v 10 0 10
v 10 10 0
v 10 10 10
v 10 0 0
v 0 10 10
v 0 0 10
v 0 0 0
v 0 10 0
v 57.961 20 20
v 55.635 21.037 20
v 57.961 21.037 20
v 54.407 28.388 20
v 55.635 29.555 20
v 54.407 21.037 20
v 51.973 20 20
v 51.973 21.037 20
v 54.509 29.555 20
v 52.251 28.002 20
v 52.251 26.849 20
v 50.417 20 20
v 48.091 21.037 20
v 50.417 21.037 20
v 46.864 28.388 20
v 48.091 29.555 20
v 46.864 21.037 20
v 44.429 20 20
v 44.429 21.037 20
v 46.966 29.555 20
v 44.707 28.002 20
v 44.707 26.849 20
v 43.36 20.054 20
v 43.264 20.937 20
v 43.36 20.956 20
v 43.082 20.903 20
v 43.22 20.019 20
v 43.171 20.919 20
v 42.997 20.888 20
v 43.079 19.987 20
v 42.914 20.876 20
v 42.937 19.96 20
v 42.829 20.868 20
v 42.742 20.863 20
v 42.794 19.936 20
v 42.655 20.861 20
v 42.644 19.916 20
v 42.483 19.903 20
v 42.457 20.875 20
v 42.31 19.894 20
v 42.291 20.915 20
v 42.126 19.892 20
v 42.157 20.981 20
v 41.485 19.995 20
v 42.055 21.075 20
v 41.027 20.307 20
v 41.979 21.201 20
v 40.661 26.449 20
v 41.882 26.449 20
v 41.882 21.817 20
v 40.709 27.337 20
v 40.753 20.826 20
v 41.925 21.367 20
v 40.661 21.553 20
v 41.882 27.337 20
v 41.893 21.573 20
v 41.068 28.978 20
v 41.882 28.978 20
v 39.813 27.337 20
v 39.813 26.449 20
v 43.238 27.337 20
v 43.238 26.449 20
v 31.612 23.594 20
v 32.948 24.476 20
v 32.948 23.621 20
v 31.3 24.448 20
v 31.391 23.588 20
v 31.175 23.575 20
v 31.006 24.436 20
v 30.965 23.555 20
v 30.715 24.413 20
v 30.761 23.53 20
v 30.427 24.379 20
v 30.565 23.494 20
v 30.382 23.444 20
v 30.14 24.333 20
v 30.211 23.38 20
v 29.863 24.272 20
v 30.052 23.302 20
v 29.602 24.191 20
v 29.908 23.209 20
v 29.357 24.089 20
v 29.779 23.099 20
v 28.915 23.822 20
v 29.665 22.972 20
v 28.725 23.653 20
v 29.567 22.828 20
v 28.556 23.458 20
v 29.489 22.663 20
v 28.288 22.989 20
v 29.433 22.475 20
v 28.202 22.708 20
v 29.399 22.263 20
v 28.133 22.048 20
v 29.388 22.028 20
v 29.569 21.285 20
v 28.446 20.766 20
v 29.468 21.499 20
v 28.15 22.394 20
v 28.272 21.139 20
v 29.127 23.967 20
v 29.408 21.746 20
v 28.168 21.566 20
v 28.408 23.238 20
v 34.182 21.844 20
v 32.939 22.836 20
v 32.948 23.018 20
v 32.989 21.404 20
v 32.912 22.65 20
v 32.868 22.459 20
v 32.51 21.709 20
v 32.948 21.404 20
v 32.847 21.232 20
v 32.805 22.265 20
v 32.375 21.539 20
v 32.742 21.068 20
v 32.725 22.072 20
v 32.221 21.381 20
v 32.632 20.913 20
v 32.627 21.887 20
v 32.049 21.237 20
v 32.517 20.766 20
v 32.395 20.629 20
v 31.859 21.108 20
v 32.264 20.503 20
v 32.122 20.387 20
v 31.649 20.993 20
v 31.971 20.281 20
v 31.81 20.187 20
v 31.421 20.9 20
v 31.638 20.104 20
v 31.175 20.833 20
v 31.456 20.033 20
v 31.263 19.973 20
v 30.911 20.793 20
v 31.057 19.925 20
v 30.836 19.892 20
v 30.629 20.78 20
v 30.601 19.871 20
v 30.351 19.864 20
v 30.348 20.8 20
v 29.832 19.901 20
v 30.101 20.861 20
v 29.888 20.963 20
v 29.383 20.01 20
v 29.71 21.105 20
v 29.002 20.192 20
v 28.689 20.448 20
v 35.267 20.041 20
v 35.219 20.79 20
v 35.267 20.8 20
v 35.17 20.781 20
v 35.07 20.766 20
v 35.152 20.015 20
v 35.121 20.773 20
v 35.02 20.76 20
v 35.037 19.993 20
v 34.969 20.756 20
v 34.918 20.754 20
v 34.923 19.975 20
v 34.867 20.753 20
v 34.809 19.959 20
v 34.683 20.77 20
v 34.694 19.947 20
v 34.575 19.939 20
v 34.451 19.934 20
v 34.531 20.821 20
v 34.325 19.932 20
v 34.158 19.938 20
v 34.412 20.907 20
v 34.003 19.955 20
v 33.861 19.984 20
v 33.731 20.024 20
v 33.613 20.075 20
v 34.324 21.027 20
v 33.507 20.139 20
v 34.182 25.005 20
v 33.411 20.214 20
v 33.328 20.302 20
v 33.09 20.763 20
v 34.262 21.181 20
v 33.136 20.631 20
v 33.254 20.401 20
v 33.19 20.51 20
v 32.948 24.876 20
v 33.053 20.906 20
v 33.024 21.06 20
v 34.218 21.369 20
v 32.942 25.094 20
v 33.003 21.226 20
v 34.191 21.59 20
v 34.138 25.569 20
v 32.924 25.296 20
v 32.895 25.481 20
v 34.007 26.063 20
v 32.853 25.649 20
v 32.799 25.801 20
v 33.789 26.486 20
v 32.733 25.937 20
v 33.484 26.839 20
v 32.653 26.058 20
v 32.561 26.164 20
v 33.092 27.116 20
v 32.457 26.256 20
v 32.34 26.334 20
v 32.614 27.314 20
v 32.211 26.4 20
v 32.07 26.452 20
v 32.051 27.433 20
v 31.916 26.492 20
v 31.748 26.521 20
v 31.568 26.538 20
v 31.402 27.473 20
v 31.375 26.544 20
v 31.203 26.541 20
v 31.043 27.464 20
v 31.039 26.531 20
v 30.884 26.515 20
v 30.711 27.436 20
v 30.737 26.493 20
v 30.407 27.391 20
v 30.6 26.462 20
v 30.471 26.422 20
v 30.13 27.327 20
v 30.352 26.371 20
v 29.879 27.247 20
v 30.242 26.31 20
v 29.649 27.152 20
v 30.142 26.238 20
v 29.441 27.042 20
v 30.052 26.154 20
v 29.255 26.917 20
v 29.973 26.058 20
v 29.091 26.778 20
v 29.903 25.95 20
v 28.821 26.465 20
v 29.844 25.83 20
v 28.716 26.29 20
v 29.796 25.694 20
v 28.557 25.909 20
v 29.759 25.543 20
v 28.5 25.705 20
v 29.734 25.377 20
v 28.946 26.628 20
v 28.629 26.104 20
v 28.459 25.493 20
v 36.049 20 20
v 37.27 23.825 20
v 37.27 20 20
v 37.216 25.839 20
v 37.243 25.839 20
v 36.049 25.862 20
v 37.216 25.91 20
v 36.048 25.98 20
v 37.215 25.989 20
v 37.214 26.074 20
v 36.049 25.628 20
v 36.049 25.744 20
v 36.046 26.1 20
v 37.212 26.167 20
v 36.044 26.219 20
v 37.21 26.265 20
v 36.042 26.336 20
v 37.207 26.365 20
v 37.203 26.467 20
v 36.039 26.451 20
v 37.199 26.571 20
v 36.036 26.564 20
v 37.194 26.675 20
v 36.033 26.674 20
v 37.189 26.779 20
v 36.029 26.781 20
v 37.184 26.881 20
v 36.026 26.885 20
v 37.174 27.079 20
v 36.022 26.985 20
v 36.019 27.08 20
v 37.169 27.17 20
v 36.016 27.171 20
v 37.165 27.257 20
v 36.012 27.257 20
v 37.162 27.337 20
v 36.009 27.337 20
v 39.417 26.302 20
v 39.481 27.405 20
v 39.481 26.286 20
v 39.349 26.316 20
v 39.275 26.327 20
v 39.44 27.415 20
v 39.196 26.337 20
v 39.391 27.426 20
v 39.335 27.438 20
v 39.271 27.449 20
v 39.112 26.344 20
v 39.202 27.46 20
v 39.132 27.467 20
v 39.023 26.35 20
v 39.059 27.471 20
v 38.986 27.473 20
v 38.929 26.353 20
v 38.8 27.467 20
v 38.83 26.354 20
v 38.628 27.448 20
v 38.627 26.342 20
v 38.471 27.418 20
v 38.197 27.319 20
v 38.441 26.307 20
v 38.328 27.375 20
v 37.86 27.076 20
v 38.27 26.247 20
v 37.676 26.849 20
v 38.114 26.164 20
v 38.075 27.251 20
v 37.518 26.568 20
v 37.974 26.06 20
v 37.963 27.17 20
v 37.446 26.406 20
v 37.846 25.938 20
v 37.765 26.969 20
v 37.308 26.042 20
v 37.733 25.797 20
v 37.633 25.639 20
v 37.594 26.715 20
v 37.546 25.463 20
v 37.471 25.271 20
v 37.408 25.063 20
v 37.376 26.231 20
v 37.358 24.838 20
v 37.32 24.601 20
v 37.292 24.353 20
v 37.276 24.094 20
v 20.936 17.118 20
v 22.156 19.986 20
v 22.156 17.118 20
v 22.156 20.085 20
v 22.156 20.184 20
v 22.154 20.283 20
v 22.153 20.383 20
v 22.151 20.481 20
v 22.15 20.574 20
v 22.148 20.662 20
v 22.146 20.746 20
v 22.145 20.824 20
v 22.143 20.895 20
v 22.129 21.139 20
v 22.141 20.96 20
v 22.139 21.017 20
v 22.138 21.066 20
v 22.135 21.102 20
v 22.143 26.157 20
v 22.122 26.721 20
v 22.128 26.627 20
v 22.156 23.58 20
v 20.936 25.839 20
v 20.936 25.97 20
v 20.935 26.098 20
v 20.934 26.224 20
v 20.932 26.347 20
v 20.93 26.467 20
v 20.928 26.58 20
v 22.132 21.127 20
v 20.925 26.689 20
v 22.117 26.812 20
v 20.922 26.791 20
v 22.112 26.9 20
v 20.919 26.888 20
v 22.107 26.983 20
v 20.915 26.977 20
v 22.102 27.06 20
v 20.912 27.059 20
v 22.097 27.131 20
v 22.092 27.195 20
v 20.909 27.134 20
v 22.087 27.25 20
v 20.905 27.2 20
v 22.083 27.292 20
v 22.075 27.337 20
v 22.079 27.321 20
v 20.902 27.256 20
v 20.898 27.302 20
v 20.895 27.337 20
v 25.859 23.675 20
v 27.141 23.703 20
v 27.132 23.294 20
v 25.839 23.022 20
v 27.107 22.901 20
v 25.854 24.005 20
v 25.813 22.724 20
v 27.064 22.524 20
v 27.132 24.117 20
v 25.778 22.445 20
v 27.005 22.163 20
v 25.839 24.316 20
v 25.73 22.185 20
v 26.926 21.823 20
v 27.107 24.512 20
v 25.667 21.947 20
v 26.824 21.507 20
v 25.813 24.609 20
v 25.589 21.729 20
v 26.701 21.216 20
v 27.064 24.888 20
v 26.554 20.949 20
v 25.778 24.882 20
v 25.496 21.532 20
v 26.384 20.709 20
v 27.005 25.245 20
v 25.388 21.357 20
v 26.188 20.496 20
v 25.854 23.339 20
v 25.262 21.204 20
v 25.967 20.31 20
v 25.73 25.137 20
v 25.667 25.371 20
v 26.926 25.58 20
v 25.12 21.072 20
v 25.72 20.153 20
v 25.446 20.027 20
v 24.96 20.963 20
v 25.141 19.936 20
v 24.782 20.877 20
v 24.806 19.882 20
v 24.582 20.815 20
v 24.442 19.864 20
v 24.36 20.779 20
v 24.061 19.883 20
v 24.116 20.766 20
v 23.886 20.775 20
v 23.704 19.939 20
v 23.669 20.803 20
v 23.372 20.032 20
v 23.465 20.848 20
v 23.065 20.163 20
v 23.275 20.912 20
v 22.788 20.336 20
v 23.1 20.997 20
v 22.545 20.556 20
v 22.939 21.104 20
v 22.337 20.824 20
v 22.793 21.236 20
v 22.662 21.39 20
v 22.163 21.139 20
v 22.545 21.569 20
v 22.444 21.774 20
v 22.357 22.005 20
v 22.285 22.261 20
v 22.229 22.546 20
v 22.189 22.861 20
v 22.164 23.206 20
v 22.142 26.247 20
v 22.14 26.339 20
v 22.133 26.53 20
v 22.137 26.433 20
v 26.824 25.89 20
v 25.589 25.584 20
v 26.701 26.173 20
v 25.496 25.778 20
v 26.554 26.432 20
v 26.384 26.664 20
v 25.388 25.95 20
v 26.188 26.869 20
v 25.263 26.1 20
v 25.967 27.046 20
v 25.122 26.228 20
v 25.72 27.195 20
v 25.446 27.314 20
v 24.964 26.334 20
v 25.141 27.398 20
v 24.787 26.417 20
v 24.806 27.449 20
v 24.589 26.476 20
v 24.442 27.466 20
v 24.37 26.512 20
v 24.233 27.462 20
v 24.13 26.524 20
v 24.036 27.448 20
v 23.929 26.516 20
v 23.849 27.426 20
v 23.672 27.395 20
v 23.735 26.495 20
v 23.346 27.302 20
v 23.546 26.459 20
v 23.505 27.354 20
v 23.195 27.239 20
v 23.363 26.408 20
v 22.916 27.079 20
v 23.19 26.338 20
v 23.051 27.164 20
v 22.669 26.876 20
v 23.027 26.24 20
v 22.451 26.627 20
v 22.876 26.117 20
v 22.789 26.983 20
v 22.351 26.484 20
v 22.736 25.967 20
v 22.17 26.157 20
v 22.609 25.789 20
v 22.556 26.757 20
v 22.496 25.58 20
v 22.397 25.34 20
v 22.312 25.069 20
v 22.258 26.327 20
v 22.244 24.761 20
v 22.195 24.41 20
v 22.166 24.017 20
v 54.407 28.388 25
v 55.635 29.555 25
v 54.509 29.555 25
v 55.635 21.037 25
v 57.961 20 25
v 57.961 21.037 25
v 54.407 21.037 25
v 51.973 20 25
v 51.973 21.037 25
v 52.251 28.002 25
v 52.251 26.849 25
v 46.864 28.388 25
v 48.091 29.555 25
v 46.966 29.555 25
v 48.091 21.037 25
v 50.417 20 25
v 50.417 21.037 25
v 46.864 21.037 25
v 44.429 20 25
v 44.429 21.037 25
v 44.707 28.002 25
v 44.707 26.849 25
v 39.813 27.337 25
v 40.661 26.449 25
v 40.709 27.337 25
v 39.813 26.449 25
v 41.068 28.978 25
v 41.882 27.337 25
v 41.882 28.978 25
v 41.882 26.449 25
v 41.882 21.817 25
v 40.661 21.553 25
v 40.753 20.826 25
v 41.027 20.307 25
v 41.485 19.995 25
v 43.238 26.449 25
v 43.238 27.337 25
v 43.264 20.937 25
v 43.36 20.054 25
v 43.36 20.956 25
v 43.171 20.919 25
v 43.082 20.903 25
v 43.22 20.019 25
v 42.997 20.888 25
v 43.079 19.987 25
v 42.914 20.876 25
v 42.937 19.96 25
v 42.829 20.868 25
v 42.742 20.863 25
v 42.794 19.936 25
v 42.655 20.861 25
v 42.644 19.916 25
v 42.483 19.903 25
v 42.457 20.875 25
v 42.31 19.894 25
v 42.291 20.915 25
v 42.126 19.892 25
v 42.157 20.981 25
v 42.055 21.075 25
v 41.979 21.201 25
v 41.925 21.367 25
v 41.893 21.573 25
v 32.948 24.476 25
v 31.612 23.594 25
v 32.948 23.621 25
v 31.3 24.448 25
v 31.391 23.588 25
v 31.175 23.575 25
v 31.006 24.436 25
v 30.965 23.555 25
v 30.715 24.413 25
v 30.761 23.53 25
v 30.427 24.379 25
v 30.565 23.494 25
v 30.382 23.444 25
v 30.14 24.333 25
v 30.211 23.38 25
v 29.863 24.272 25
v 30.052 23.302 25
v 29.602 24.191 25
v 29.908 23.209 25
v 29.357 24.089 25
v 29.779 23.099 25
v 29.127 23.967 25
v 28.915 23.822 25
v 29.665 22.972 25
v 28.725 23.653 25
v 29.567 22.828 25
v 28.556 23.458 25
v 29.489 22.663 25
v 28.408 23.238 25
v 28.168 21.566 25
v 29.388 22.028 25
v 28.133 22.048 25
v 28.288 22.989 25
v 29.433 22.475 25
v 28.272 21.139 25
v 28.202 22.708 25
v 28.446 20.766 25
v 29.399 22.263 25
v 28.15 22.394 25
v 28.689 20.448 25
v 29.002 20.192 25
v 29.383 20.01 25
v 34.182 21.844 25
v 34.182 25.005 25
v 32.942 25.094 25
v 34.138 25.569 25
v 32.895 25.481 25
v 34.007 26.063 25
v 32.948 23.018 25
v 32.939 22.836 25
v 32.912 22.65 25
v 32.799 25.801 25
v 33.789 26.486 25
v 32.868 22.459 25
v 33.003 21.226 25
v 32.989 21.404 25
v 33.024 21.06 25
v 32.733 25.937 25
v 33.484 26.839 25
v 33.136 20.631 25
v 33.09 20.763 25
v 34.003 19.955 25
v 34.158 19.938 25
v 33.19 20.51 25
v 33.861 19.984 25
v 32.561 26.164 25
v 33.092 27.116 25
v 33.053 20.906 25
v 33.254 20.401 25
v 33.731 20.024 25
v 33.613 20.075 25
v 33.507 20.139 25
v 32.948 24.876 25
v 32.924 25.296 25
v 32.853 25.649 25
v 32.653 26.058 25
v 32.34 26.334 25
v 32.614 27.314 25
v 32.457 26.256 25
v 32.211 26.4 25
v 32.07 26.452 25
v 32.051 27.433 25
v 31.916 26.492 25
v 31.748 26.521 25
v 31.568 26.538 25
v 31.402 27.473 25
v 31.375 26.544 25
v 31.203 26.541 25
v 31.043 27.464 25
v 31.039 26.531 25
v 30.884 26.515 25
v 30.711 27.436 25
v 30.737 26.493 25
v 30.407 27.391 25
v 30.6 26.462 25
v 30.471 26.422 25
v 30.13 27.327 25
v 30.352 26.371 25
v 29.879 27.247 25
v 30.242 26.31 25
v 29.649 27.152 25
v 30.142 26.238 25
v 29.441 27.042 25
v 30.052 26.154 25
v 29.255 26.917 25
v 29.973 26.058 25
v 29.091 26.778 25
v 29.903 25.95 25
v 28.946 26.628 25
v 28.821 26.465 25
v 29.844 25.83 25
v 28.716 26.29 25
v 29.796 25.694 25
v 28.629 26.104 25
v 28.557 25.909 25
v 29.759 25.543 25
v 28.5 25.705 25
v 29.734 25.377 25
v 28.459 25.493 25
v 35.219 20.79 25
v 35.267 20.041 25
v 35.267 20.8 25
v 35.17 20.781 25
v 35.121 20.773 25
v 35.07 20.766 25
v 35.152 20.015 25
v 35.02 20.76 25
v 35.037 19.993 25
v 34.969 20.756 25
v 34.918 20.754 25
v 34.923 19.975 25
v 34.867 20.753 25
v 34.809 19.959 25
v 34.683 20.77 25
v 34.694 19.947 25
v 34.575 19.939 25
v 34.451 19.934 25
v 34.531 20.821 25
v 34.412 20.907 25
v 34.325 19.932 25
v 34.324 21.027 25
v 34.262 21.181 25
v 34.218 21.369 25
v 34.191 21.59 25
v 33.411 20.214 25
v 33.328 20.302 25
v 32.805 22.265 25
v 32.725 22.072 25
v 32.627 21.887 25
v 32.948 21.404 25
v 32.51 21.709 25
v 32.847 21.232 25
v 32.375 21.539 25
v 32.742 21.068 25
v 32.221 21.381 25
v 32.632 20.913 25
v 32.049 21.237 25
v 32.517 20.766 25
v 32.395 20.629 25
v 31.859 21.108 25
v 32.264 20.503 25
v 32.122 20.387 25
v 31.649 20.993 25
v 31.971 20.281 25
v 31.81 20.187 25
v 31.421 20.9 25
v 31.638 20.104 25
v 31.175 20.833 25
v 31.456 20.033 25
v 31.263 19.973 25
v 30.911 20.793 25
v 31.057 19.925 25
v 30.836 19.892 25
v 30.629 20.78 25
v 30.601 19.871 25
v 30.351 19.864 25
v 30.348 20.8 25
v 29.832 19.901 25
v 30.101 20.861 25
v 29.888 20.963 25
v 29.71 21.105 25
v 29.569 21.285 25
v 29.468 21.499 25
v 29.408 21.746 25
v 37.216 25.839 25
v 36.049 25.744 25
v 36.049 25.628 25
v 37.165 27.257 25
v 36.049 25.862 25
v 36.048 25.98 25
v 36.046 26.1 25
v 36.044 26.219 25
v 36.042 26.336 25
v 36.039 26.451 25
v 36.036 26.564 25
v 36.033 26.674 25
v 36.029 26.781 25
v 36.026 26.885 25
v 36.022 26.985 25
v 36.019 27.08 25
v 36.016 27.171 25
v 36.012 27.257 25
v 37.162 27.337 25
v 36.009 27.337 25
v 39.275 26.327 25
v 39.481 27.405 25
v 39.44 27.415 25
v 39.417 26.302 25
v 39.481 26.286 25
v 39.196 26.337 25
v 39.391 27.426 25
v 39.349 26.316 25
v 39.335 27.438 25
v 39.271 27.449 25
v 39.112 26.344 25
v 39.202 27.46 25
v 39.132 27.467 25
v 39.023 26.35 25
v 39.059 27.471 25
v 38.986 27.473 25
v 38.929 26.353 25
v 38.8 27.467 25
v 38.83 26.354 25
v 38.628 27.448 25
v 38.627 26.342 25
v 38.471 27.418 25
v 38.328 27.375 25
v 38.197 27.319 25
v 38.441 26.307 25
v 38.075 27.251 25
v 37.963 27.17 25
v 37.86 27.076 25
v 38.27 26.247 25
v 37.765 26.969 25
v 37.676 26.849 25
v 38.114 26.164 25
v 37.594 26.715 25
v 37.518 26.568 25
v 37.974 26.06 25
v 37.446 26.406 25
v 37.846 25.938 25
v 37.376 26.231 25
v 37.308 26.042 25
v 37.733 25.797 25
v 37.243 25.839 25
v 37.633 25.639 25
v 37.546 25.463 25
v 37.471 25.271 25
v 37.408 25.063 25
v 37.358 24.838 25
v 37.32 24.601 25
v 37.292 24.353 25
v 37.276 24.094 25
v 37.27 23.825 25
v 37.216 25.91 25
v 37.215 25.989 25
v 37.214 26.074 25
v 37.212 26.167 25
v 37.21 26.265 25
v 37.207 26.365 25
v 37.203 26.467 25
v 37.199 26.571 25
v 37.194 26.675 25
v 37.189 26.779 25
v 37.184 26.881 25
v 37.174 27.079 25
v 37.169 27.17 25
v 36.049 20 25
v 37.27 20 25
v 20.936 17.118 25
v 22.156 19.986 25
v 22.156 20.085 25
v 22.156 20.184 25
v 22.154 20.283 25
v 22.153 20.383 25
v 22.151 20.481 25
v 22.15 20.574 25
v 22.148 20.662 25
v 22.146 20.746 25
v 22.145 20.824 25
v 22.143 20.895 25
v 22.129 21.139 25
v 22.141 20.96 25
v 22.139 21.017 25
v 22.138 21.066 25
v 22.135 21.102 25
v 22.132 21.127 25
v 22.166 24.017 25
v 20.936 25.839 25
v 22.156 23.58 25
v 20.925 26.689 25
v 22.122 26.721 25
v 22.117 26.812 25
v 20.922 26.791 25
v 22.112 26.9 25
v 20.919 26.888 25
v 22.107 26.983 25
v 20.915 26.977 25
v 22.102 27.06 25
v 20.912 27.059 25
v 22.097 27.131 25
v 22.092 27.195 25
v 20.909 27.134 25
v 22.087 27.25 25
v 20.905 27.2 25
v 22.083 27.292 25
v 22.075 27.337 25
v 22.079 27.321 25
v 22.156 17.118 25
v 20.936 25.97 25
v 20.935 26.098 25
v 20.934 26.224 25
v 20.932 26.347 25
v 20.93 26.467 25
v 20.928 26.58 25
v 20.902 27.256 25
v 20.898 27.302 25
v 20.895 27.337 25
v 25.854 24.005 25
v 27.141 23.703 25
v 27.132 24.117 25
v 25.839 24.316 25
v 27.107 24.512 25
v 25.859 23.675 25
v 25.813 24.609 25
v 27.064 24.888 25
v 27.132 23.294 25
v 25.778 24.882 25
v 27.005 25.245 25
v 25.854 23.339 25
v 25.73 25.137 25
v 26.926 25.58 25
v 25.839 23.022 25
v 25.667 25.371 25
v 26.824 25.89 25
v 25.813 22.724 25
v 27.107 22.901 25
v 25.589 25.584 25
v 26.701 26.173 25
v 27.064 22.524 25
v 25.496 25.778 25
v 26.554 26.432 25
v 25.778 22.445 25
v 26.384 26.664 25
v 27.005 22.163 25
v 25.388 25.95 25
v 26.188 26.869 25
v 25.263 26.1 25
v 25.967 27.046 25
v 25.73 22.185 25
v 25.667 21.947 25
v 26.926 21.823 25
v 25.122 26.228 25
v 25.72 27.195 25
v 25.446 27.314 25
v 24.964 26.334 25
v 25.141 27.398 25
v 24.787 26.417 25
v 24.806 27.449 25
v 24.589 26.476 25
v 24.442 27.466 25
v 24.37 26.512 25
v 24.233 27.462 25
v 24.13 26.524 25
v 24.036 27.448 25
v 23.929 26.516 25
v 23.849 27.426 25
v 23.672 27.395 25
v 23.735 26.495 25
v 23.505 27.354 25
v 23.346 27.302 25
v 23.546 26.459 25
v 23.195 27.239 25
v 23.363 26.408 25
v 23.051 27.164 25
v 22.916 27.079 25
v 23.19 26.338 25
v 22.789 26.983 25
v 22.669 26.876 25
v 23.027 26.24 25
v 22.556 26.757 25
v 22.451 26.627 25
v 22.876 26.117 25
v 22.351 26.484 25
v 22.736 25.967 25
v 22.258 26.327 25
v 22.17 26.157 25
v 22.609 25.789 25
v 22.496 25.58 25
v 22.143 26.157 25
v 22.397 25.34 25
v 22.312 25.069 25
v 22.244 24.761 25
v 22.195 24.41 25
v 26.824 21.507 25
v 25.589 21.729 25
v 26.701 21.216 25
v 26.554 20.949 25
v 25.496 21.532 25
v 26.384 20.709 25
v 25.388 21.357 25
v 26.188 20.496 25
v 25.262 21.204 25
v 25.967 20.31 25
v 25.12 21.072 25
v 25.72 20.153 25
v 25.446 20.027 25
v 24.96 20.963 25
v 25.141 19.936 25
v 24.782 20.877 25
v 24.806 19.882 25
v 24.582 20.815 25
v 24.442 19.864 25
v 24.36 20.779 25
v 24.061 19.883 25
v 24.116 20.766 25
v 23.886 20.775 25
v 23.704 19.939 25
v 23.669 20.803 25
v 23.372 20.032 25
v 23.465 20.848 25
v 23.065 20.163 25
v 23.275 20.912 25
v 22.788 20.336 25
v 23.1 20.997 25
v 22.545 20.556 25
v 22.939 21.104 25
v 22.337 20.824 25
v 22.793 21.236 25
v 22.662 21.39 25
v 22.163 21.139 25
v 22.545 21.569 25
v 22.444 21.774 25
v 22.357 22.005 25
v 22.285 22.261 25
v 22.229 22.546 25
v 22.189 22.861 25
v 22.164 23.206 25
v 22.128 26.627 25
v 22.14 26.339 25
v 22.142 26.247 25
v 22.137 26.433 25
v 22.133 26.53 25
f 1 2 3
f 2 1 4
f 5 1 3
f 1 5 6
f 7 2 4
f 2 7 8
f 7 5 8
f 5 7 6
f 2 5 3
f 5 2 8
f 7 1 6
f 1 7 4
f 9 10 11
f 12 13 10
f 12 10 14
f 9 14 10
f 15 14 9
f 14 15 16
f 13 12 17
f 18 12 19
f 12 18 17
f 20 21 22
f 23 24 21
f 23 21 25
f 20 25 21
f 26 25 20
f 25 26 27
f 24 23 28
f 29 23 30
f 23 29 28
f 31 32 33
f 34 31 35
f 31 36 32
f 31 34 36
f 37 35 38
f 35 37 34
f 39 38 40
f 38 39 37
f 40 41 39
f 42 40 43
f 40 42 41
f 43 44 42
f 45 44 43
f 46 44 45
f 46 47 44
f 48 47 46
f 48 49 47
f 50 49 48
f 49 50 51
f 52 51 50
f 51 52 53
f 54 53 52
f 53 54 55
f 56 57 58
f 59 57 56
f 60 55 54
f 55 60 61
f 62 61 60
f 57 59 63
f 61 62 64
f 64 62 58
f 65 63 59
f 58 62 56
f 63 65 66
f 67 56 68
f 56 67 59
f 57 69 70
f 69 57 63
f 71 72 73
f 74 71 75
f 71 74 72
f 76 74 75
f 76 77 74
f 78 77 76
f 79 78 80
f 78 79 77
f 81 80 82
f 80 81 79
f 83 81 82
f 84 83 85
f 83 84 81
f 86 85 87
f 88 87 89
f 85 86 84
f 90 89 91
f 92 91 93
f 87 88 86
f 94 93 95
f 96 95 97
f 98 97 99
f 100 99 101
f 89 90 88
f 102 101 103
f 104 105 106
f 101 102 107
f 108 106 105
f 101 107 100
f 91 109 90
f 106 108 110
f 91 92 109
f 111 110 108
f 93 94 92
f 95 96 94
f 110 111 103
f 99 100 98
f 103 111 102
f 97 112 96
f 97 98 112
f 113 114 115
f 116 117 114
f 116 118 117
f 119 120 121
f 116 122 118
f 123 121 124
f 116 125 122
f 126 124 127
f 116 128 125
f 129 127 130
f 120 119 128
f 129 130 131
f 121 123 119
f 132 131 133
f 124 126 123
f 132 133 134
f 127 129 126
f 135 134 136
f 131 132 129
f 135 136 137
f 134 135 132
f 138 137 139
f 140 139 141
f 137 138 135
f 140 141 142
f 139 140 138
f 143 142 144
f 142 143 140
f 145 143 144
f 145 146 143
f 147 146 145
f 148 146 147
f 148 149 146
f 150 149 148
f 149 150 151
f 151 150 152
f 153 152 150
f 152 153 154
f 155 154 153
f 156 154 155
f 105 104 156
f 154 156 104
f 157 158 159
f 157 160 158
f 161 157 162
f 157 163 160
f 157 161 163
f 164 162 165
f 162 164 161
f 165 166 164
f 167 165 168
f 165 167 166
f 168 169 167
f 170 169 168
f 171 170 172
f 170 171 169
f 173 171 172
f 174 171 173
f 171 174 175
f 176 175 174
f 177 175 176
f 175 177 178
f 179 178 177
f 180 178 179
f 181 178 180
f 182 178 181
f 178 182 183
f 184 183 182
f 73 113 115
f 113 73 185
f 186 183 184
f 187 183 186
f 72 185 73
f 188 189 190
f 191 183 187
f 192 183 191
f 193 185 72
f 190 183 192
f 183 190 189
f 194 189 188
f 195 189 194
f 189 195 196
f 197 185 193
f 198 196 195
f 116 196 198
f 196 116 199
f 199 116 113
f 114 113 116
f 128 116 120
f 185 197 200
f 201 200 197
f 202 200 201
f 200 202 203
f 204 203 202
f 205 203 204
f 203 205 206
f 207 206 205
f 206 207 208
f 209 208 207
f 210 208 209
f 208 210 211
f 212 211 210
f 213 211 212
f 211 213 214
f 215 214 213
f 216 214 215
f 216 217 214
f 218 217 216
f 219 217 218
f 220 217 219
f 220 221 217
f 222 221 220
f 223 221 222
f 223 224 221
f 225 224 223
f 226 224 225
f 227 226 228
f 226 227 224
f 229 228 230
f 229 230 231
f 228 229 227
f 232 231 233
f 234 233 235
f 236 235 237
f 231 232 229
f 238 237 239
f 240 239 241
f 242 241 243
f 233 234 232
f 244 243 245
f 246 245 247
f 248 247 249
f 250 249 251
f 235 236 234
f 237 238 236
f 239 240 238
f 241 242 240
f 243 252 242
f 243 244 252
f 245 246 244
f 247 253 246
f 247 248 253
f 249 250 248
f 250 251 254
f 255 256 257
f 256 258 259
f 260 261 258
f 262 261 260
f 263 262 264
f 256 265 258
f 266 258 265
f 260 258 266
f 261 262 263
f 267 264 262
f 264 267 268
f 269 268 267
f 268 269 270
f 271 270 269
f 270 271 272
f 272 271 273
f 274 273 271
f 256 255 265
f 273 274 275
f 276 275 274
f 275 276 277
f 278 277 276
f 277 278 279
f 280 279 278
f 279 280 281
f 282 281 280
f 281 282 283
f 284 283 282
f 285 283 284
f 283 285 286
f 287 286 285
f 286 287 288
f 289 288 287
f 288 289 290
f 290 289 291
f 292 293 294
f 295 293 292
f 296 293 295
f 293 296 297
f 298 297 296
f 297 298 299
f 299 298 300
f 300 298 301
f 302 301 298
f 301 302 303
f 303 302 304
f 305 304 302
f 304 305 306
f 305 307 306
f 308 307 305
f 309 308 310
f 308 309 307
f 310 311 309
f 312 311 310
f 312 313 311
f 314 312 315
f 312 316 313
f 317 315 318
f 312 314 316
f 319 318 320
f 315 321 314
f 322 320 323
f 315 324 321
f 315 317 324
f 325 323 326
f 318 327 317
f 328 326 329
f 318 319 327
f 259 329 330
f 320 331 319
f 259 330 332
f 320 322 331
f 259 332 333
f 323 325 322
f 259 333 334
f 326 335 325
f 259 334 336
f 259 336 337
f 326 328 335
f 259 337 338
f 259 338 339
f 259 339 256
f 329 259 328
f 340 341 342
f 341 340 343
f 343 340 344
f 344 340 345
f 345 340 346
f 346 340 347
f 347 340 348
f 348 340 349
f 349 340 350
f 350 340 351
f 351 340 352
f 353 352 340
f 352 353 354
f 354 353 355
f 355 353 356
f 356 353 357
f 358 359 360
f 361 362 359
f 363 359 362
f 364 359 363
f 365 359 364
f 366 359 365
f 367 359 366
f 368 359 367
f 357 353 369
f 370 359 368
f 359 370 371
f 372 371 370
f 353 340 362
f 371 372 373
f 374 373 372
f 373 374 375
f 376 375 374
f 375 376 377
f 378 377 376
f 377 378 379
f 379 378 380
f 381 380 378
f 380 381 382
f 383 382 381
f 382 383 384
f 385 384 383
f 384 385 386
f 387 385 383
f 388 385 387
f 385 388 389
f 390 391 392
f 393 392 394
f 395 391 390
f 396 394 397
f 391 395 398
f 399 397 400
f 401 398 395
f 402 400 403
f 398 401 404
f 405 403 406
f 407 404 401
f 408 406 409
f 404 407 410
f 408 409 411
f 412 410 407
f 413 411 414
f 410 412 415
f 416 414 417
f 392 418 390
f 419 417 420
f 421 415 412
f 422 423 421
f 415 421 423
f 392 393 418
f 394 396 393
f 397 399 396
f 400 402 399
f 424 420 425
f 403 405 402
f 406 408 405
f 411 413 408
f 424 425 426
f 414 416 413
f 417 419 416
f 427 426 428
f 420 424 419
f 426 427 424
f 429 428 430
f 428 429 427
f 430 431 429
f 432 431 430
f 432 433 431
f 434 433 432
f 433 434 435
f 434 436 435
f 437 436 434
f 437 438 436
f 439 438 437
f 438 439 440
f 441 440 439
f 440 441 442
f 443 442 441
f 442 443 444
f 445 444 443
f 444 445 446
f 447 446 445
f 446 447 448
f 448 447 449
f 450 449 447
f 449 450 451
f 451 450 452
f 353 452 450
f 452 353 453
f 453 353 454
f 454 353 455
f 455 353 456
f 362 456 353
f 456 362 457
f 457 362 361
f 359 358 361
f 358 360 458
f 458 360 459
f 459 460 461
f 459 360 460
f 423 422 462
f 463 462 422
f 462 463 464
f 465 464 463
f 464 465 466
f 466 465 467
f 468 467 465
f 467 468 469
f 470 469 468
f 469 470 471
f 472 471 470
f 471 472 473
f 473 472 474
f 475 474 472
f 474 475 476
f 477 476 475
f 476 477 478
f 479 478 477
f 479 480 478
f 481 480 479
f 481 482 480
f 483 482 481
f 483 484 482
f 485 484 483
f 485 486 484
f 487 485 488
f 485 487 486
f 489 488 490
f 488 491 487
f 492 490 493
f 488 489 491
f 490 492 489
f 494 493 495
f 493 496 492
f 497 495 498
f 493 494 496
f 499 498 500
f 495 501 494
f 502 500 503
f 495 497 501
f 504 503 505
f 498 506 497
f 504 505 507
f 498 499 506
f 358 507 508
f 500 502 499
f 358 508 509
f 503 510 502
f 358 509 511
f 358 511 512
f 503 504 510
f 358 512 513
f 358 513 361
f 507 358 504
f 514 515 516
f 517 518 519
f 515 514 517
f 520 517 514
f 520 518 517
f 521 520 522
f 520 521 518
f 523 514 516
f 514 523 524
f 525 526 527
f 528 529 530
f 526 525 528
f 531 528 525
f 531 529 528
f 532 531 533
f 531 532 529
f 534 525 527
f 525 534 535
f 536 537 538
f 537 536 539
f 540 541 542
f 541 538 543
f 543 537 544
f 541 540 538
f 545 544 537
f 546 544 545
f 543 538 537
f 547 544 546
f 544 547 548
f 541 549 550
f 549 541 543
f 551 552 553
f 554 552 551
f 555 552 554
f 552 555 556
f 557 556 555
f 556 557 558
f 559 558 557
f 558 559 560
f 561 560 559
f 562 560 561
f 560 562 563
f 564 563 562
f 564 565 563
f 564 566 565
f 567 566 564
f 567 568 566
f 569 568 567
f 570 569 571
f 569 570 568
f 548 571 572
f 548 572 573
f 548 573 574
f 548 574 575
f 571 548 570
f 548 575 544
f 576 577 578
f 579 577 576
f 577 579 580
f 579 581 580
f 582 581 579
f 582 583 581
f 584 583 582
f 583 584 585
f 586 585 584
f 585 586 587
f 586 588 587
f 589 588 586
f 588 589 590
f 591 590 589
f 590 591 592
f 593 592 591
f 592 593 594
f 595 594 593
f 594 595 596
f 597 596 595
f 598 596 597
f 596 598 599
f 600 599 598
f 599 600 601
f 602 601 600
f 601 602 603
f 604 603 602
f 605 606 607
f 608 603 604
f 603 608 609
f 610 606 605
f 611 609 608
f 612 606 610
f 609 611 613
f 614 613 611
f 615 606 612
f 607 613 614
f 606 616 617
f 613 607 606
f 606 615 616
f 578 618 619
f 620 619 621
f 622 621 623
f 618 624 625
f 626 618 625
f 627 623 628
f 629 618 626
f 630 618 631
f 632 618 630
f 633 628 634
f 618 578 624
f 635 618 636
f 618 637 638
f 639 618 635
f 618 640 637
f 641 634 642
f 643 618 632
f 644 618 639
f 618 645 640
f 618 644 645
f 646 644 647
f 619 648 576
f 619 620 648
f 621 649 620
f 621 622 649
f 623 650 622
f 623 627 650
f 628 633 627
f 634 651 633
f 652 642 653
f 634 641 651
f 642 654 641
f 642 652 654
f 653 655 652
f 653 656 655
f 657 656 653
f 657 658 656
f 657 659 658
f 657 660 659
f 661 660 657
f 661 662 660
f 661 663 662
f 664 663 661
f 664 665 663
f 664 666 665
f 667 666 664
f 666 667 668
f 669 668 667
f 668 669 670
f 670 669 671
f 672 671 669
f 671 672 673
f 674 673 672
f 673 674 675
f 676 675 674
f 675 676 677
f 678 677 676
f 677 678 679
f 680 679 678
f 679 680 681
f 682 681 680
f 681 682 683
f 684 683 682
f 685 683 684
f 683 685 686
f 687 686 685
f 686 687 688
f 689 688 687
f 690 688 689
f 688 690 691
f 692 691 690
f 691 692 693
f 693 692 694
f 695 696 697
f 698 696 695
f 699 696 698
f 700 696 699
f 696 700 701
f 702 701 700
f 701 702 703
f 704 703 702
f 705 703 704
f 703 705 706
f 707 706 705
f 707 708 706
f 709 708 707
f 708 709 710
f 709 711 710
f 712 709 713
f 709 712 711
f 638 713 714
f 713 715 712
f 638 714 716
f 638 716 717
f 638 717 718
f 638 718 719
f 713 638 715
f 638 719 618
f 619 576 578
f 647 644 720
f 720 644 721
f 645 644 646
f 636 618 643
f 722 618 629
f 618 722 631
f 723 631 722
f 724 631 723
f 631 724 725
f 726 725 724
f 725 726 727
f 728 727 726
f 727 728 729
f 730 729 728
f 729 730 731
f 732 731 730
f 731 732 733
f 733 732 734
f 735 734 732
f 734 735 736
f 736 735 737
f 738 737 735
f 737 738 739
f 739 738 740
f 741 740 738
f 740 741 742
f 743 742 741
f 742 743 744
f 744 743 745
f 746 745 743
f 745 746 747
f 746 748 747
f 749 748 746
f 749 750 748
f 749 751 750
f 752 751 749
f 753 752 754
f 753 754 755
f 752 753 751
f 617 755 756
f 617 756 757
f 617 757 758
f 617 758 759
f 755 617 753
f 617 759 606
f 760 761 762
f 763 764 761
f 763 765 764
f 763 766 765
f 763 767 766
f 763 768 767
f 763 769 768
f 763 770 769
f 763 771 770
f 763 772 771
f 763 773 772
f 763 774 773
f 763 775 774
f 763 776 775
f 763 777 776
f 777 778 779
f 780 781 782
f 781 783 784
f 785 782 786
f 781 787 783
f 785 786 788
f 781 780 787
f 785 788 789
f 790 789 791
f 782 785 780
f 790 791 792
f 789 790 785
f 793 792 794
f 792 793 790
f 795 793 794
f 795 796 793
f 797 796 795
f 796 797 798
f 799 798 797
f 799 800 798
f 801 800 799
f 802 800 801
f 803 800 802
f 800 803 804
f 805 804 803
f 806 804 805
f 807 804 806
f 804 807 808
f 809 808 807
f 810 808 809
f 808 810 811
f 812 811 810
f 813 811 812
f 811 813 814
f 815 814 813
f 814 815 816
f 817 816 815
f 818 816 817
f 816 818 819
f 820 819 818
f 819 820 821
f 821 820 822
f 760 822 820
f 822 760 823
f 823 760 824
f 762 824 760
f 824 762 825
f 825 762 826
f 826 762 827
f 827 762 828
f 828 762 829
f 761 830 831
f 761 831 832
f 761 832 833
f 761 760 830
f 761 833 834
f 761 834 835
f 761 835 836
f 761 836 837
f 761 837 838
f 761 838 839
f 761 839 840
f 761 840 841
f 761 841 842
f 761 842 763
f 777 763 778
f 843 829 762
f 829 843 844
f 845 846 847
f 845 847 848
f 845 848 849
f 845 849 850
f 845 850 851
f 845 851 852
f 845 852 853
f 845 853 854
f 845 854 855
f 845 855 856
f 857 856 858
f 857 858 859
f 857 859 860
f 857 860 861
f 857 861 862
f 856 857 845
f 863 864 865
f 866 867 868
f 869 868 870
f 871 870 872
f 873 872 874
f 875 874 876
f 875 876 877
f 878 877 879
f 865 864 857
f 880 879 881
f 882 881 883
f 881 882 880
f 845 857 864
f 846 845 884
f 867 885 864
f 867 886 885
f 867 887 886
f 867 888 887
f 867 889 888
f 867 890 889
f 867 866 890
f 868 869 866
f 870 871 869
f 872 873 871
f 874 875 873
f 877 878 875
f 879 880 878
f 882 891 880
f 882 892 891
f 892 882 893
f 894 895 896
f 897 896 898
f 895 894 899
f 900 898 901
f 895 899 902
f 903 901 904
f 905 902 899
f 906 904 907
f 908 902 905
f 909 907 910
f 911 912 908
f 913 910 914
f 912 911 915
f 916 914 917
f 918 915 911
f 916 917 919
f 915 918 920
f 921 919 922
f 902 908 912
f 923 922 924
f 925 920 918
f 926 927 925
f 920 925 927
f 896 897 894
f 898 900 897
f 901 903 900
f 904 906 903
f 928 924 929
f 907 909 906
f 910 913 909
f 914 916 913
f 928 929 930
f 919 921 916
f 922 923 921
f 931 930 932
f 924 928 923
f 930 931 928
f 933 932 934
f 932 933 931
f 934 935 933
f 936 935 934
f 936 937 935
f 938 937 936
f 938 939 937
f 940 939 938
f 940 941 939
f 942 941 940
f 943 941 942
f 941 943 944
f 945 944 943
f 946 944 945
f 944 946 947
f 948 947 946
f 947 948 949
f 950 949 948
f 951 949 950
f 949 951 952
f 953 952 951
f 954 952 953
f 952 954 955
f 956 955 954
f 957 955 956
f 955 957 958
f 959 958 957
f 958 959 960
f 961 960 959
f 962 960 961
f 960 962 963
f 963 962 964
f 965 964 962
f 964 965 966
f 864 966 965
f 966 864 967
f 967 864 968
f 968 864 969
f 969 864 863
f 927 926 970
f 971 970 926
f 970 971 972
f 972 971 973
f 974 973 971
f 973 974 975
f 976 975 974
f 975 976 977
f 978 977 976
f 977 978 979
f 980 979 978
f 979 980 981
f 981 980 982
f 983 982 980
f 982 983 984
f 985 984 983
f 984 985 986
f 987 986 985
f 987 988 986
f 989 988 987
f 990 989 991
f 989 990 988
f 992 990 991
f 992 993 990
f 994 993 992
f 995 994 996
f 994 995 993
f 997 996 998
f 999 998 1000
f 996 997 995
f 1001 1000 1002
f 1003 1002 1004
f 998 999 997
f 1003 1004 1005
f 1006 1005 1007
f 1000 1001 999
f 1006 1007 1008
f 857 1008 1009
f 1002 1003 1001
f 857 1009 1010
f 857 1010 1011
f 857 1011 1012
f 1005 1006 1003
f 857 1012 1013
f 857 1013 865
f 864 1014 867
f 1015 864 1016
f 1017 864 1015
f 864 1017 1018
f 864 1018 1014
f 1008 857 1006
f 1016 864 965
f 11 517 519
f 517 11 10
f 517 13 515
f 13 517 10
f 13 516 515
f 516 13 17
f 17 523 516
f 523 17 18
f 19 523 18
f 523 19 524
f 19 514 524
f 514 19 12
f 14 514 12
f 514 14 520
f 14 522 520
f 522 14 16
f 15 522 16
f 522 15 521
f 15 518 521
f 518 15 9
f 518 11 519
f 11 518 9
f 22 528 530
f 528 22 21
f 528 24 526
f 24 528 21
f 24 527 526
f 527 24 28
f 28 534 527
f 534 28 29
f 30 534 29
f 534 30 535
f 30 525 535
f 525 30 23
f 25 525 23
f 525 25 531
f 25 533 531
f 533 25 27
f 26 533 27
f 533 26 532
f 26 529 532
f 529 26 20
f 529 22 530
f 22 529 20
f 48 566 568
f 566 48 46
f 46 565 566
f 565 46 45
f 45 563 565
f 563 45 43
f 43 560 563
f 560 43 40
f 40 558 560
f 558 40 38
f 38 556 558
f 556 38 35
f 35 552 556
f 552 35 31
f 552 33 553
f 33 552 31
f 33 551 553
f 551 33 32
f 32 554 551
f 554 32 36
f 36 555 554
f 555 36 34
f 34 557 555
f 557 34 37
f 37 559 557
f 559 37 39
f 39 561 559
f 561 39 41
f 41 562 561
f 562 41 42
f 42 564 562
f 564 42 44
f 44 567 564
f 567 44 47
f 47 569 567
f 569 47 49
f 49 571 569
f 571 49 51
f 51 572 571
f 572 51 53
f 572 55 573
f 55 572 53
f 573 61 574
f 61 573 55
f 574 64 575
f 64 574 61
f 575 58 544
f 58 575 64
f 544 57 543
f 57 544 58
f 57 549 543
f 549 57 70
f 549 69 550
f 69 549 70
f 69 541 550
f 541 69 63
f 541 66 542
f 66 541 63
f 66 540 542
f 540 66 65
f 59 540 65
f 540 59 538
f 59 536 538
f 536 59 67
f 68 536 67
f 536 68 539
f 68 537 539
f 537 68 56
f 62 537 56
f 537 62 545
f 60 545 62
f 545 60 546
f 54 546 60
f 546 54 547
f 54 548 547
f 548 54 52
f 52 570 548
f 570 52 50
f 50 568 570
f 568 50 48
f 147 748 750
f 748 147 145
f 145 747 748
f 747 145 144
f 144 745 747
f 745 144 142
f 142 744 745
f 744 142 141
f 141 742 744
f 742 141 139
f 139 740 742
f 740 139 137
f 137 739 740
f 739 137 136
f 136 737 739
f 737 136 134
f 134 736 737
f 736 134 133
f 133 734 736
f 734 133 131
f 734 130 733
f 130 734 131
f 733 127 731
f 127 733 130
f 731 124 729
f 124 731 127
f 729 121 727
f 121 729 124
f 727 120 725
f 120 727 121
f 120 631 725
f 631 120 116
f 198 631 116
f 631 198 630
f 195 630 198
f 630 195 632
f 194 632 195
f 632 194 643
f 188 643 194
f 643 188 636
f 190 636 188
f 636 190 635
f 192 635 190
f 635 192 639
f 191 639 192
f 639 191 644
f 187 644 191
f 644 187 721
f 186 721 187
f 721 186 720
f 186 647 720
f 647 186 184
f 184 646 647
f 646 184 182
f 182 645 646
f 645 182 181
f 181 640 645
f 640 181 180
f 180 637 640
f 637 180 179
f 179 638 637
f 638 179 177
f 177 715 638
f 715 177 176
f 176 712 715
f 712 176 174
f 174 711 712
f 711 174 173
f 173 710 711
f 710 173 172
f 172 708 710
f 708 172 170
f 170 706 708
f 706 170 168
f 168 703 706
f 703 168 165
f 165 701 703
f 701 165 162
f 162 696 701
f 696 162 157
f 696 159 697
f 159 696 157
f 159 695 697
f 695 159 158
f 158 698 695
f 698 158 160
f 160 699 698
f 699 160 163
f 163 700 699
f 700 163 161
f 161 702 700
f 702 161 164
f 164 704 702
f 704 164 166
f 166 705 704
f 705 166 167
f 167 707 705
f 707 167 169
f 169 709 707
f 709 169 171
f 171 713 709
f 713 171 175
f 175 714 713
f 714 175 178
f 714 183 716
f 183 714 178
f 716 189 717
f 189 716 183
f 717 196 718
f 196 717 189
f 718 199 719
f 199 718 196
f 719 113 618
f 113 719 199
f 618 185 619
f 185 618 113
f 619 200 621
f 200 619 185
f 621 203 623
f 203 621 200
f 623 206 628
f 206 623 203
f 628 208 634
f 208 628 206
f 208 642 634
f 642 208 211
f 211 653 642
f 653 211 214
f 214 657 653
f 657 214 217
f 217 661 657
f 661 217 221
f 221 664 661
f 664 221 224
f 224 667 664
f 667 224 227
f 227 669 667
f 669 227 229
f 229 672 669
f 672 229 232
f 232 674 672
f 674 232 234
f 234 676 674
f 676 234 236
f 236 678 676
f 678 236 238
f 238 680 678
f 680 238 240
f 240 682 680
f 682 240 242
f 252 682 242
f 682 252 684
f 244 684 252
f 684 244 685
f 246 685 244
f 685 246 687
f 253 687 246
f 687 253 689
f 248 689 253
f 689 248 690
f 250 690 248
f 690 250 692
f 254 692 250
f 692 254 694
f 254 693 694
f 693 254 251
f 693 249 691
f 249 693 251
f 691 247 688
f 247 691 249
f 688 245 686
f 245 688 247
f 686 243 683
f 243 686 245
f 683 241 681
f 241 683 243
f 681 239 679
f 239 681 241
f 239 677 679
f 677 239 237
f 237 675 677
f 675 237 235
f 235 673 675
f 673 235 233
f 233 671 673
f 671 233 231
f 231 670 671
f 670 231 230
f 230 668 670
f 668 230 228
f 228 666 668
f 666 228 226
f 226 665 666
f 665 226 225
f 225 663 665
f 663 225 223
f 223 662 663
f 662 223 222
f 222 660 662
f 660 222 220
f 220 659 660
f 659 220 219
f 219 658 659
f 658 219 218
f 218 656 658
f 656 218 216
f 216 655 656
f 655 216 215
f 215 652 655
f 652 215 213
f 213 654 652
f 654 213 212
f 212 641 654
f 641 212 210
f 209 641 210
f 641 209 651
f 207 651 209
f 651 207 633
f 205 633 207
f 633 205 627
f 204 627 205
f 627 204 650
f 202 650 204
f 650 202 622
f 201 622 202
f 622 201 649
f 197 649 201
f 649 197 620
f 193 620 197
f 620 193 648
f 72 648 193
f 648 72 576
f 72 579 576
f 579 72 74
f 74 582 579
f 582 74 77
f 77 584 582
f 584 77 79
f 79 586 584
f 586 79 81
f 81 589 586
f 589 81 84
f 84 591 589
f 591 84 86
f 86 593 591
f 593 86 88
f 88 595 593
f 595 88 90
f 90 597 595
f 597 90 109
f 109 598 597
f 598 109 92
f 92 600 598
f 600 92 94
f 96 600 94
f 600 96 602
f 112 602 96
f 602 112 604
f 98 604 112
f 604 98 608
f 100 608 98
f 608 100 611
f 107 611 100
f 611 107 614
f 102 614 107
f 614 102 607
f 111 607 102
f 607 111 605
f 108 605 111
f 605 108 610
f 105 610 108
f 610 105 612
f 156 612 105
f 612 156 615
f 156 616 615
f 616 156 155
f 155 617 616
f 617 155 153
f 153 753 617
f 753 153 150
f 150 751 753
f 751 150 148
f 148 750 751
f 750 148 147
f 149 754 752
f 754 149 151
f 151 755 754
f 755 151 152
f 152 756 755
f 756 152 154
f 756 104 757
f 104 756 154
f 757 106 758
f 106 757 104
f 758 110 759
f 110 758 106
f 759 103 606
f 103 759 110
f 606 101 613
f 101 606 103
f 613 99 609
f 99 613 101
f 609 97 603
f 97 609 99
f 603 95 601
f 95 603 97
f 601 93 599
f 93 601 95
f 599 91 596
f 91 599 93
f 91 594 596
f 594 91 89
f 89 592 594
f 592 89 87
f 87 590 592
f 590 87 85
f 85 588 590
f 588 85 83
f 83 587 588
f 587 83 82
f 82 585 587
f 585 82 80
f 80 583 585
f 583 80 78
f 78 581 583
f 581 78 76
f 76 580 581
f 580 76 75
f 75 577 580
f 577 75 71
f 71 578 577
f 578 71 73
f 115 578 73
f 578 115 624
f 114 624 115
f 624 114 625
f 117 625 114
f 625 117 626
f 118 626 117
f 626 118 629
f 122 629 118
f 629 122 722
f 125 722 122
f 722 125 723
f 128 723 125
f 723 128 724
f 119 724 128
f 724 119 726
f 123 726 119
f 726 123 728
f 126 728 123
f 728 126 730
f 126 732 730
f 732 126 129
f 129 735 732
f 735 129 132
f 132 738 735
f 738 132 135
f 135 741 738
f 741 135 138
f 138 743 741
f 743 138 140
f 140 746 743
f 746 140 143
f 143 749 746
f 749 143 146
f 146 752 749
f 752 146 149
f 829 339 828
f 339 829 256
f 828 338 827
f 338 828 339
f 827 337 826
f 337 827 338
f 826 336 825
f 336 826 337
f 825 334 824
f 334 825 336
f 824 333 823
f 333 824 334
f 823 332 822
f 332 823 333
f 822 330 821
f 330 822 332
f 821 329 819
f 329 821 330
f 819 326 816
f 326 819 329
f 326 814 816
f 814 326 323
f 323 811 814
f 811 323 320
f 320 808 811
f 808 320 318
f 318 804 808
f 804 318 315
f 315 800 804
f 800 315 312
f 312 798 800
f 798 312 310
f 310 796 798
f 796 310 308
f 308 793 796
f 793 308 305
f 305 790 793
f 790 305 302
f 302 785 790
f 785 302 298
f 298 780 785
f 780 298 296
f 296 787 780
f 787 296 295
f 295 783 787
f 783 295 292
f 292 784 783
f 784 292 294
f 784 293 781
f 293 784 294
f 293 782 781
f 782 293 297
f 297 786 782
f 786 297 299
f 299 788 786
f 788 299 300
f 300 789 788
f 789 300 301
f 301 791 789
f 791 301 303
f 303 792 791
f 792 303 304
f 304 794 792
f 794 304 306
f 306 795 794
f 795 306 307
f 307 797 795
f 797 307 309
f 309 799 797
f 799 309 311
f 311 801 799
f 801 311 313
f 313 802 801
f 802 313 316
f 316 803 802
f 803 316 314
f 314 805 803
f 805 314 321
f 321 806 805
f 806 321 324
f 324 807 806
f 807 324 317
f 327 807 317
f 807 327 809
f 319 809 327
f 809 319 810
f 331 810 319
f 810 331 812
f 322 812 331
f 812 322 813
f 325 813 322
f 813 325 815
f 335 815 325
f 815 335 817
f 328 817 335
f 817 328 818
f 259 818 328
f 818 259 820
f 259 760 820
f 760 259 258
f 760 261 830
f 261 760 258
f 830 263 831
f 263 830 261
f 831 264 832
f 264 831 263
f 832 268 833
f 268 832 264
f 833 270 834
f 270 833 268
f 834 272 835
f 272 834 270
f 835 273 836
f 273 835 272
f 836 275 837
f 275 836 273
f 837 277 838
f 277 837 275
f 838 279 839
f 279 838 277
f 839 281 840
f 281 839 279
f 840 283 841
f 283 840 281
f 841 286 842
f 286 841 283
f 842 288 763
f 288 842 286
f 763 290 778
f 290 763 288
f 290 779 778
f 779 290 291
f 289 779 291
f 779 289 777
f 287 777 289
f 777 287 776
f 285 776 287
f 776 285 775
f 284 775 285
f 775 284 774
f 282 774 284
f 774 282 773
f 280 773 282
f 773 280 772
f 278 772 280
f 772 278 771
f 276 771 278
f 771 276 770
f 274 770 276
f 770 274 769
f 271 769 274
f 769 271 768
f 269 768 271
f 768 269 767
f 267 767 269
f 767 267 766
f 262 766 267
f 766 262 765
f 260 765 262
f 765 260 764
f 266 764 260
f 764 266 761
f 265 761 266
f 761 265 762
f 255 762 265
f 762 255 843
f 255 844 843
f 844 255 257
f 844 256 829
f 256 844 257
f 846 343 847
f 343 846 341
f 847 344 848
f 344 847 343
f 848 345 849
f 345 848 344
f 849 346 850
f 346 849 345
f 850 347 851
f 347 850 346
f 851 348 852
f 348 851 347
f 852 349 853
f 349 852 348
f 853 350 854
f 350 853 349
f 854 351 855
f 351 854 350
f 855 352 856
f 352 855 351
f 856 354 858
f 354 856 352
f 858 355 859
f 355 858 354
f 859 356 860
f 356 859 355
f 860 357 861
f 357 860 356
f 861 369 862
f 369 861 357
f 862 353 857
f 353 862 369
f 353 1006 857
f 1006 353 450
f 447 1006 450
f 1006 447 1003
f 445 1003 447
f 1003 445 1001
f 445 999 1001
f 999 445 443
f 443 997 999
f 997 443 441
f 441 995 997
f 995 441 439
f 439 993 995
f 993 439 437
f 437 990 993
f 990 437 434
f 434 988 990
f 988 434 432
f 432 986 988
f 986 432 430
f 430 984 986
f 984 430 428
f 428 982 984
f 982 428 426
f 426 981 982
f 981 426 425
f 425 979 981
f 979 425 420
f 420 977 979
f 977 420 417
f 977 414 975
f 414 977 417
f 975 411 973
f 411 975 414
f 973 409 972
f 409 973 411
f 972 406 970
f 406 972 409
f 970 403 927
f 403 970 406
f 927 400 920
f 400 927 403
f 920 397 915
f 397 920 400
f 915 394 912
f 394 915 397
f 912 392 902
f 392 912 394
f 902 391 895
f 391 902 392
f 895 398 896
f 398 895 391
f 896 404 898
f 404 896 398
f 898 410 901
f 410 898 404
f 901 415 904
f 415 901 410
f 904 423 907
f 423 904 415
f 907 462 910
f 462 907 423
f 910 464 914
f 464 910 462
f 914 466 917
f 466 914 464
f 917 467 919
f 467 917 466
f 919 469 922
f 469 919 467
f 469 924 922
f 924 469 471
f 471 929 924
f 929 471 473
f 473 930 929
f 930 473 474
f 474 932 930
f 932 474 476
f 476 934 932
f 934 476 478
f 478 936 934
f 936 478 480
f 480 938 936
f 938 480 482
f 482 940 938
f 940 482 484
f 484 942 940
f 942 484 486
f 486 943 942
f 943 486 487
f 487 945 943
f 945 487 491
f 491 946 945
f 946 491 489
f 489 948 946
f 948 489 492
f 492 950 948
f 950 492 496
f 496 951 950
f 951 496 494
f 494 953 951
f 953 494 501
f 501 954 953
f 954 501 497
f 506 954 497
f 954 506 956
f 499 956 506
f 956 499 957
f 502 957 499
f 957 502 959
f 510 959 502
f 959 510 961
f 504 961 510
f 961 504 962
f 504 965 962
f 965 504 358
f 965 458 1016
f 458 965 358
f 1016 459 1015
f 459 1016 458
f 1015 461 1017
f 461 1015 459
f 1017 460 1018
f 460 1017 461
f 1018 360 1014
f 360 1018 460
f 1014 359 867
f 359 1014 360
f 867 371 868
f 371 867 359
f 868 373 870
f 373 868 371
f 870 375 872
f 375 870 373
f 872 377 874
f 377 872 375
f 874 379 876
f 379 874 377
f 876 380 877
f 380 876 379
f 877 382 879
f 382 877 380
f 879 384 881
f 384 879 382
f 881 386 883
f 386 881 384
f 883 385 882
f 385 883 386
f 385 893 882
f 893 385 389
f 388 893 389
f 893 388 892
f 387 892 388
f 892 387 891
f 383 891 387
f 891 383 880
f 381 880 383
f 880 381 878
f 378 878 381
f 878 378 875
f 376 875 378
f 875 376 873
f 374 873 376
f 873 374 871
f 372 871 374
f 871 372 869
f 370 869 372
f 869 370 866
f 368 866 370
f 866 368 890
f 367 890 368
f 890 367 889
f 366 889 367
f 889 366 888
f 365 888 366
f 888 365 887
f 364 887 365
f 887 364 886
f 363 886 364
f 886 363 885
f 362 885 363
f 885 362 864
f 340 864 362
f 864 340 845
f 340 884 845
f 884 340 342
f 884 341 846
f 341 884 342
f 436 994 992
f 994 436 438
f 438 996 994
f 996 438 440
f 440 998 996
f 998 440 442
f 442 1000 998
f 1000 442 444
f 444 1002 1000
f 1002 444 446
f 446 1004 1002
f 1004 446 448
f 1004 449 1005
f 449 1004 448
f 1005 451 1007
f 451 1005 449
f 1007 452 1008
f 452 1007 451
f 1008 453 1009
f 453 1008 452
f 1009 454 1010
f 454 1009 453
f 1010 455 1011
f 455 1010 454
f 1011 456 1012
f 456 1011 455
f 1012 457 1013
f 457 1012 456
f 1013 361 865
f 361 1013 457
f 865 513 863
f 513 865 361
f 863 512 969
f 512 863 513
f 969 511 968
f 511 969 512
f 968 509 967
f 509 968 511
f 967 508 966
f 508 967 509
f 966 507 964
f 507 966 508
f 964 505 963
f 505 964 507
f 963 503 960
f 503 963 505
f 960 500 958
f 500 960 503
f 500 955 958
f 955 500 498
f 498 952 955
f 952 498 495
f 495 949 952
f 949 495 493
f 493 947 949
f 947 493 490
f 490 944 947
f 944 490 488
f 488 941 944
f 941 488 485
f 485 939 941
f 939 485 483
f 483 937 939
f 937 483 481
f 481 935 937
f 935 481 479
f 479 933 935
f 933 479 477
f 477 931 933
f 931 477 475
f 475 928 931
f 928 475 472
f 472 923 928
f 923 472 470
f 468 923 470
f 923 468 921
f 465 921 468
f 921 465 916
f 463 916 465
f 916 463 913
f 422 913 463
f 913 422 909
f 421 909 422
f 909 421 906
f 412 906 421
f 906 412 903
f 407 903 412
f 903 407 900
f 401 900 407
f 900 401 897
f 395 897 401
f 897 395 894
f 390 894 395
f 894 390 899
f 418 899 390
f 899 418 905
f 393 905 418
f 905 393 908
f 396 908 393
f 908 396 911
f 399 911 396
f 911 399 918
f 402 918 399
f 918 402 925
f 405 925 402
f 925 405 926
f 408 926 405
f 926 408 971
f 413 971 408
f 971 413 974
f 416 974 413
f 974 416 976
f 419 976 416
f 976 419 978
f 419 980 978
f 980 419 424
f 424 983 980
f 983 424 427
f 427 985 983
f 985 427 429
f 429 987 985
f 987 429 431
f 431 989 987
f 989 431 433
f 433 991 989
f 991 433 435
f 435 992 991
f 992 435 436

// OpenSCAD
//[CUSTOMIZATION]
// X Dimension
xdim=10;
// Y Dimension
ydim=15;
// Z Dimension
zdim=7;
// Message
txt="part11";
module __END_CUSTOMIZATIONS () {}
cube(xdim,ydim,zdim);
translate([20,20,20]) { linear_extrude(5) text(txt, font="Liberation Sans"); }
